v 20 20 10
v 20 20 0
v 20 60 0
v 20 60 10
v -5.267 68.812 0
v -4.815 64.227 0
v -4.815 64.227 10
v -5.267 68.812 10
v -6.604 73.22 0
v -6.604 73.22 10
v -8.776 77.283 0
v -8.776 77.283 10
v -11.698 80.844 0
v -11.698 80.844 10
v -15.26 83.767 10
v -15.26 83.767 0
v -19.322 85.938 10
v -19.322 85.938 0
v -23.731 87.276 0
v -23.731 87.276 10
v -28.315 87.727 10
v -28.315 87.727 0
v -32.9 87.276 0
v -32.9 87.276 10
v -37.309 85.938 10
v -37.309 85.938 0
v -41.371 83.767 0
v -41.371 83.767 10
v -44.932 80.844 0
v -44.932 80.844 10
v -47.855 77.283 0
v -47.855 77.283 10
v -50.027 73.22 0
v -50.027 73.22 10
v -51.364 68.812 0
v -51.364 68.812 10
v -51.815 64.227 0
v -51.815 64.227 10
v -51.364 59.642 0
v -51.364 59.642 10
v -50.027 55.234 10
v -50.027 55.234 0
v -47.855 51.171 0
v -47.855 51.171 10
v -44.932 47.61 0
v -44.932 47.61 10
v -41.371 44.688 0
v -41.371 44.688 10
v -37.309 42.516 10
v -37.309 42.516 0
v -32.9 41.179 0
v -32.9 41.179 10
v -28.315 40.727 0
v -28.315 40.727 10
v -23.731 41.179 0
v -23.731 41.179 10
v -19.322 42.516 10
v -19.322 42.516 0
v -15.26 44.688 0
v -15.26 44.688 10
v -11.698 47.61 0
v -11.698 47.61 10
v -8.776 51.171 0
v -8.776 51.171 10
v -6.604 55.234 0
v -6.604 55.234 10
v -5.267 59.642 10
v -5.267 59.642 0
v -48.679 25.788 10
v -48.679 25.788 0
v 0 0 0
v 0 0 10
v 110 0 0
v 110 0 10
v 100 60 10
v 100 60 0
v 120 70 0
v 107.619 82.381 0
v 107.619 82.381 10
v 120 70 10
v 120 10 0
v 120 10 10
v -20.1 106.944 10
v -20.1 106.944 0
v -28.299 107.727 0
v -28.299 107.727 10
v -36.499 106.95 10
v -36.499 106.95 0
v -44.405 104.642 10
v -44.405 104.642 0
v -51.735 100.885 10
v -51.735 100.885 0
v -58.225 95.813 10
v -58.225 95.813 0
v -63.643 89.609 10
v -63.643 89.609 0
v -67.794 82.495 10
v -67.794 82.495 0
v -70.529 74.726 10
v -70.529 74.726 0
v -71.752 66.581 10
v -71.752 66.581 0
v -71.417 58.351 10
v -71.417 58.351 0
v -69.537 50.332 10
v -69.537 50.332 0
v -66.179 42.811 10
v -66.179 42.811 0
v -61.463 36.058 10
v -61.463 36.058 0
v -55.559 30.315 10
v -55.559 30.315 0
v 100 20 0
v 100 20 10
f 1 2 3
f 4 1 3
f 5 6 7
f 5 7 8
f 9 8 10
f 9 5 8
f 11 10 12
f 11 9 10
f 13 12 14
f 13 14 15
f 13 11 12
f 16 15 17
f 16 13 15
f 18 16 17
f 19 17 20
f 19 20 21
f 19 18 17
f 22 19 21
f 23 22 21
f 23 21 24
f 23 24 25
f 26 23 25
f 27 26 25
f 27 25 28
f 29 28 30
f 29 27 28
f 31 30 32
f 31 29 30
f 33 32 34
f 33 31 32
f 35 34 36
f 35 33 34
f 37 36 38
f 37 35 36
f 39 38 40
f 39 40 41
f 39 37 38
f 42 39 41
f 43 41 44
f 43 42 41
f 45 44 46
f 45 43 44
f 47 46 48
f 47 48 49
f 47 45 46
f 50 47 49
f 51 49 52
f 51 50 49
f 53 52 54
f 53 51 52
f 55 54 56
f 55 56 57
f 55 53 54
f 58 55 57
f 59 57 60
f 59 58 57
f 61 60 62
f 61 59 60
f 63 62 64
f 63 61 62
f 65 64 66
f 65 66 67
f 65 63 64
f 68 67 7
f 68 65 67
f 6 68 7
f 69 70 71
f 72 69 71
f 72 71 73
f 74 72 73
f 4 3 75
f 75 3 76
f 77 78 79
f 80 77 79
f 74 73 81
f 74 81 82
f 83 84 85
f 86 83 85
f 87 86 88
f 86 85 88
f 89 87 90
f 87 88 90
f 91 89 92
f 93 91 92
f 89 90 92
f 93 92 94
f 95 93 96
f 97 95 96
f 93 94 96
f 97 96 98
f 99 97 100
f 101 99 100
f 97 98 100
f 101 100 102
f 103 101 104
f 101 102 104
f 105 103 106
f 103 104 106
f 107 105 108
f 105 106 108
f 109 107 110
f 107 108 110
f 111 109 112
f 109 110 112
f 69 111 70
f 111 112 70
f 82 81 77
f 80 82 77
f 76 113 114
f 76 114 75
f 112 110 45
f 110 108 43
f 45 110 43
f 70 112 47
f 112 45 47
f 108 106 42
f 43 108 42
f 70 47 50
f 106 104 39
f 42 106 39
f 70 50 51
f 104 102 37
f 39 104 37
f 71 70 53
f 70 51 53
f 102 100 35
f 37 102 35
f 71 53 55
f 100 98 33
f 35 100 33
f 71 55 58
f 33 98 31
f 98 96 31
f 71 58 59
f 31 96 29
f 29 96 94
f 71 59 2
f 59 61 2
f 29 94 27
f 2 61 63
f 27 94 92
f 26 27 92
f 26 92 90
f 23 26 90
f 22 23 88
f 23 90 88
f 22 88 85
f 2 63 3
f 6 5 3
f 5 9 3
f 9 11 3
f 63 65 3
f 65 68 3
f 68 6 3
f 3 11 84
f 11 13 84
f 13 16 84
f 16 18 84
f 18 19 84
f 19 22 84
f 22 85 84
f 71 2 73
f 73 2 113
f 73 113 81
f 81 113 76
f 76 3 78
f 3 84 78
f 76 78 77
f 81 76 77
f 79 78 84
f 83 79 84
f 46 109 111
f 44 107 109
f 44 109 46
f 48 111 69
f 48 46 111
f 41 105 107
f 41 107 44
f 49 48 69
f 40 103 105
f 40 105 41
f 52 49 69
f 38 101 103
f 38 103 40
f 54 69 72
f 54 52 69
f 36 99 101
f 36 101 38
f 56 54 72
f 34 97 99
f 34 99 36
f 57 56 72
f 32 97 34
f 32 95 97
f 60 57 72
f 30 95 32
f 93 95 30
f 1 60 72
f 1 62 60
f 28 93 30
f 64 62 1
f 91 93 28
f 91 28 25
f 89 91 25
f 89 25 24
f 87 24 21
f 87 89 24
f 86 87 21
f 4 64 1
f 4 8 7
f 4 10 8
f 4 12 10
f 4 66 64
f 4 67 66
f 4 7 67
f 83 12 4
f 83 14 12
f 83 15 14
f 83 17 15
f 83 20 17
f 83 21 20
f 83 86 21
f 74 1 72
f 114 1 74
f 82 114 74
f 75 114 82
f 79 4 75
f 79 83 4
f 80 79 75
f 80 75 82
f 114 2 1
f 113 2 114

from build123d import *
from OCP.BRepFilletAPI import BRepFilletAPI_MakeChamfer

# Parameters (mm, degrees)
ESQUISSE1_R        = 23.5
ESQUISSE1_W        = 80
ESQUISSE1_H        = 40
BOSS_EXTRU_1_DEPTH = 10
CHANFREIN1_SIZE    = 10
CHANFREIN1_SIZE2   = 12.608056975


with BuildPart() as part:
    # Esquisse1 → Boss.-Extru.1 (new body)
    with BuildSketch(Plane.XY):
        with BuildLine():
            Line((0, 0), (120, 0))
            Line((120, 0), (120, 80))
            Line((120, 80), (-20.100018314, 106.944225709))
            ThreePointArc((-20.100018314, 106.944225709), (-69.345781346, 78.675628662), (-48.678780146, 25.787692258))
            Line((-48.678780146, 25.787692258), (0, 0))
        make_face()
        with Locations((-28.315442857, 64.227053523)):
            Circle(ESQUISSE1_R, mode=Mode.SUBTRACT)
        with Locations((60, 40)):
            Rectangle(ESQUISSE1_W, ESQUISSE1_H, mode=Mode.SUBTRACT)
    extrude(amount=BOSS_EXTRU_1_DEPTH)

    # Chanfrein1: one chamfer whose edges measure the first distance from different faces: ONE call of the kernel's chamfer builder (chamfer() names one face for all edges)
    chanfrein1_edges_1 = [part.edges().sort_by_distance(p)[0] for p in [
        (120, 80, 5),
    ]]
    chanfrein1_side_1 = [part.faces().sort_by_distance(p)[0] for p in [
        (120, 40, 5),
    ]]
    chanfrein1_edges_2 = [part.edges().sort_by_distance(p)[0] for p in [
        (120, 0, 5),
    ]]
    chanfrein1 = BRepFilletAPI_MakeChamfer(part.part.solid().wrapped)
    for e in chanfrein1_edges_1:
        chanfrein1.Add(CHANFREIN1_SIZE, CHANFREIN1_SIZE2, e.wrapped, chanfrein1_side_1[0].wrapped)  # the first distance lies on this face
    for e in chanfrein1_edges_2:
        chanfrein1.Add(CHANFREIN1_SIZE, e.wrapped)
    add(Compound.cast(chanfrein1.Shape()), mode=Mode.REPLACE)


solid = part.part
